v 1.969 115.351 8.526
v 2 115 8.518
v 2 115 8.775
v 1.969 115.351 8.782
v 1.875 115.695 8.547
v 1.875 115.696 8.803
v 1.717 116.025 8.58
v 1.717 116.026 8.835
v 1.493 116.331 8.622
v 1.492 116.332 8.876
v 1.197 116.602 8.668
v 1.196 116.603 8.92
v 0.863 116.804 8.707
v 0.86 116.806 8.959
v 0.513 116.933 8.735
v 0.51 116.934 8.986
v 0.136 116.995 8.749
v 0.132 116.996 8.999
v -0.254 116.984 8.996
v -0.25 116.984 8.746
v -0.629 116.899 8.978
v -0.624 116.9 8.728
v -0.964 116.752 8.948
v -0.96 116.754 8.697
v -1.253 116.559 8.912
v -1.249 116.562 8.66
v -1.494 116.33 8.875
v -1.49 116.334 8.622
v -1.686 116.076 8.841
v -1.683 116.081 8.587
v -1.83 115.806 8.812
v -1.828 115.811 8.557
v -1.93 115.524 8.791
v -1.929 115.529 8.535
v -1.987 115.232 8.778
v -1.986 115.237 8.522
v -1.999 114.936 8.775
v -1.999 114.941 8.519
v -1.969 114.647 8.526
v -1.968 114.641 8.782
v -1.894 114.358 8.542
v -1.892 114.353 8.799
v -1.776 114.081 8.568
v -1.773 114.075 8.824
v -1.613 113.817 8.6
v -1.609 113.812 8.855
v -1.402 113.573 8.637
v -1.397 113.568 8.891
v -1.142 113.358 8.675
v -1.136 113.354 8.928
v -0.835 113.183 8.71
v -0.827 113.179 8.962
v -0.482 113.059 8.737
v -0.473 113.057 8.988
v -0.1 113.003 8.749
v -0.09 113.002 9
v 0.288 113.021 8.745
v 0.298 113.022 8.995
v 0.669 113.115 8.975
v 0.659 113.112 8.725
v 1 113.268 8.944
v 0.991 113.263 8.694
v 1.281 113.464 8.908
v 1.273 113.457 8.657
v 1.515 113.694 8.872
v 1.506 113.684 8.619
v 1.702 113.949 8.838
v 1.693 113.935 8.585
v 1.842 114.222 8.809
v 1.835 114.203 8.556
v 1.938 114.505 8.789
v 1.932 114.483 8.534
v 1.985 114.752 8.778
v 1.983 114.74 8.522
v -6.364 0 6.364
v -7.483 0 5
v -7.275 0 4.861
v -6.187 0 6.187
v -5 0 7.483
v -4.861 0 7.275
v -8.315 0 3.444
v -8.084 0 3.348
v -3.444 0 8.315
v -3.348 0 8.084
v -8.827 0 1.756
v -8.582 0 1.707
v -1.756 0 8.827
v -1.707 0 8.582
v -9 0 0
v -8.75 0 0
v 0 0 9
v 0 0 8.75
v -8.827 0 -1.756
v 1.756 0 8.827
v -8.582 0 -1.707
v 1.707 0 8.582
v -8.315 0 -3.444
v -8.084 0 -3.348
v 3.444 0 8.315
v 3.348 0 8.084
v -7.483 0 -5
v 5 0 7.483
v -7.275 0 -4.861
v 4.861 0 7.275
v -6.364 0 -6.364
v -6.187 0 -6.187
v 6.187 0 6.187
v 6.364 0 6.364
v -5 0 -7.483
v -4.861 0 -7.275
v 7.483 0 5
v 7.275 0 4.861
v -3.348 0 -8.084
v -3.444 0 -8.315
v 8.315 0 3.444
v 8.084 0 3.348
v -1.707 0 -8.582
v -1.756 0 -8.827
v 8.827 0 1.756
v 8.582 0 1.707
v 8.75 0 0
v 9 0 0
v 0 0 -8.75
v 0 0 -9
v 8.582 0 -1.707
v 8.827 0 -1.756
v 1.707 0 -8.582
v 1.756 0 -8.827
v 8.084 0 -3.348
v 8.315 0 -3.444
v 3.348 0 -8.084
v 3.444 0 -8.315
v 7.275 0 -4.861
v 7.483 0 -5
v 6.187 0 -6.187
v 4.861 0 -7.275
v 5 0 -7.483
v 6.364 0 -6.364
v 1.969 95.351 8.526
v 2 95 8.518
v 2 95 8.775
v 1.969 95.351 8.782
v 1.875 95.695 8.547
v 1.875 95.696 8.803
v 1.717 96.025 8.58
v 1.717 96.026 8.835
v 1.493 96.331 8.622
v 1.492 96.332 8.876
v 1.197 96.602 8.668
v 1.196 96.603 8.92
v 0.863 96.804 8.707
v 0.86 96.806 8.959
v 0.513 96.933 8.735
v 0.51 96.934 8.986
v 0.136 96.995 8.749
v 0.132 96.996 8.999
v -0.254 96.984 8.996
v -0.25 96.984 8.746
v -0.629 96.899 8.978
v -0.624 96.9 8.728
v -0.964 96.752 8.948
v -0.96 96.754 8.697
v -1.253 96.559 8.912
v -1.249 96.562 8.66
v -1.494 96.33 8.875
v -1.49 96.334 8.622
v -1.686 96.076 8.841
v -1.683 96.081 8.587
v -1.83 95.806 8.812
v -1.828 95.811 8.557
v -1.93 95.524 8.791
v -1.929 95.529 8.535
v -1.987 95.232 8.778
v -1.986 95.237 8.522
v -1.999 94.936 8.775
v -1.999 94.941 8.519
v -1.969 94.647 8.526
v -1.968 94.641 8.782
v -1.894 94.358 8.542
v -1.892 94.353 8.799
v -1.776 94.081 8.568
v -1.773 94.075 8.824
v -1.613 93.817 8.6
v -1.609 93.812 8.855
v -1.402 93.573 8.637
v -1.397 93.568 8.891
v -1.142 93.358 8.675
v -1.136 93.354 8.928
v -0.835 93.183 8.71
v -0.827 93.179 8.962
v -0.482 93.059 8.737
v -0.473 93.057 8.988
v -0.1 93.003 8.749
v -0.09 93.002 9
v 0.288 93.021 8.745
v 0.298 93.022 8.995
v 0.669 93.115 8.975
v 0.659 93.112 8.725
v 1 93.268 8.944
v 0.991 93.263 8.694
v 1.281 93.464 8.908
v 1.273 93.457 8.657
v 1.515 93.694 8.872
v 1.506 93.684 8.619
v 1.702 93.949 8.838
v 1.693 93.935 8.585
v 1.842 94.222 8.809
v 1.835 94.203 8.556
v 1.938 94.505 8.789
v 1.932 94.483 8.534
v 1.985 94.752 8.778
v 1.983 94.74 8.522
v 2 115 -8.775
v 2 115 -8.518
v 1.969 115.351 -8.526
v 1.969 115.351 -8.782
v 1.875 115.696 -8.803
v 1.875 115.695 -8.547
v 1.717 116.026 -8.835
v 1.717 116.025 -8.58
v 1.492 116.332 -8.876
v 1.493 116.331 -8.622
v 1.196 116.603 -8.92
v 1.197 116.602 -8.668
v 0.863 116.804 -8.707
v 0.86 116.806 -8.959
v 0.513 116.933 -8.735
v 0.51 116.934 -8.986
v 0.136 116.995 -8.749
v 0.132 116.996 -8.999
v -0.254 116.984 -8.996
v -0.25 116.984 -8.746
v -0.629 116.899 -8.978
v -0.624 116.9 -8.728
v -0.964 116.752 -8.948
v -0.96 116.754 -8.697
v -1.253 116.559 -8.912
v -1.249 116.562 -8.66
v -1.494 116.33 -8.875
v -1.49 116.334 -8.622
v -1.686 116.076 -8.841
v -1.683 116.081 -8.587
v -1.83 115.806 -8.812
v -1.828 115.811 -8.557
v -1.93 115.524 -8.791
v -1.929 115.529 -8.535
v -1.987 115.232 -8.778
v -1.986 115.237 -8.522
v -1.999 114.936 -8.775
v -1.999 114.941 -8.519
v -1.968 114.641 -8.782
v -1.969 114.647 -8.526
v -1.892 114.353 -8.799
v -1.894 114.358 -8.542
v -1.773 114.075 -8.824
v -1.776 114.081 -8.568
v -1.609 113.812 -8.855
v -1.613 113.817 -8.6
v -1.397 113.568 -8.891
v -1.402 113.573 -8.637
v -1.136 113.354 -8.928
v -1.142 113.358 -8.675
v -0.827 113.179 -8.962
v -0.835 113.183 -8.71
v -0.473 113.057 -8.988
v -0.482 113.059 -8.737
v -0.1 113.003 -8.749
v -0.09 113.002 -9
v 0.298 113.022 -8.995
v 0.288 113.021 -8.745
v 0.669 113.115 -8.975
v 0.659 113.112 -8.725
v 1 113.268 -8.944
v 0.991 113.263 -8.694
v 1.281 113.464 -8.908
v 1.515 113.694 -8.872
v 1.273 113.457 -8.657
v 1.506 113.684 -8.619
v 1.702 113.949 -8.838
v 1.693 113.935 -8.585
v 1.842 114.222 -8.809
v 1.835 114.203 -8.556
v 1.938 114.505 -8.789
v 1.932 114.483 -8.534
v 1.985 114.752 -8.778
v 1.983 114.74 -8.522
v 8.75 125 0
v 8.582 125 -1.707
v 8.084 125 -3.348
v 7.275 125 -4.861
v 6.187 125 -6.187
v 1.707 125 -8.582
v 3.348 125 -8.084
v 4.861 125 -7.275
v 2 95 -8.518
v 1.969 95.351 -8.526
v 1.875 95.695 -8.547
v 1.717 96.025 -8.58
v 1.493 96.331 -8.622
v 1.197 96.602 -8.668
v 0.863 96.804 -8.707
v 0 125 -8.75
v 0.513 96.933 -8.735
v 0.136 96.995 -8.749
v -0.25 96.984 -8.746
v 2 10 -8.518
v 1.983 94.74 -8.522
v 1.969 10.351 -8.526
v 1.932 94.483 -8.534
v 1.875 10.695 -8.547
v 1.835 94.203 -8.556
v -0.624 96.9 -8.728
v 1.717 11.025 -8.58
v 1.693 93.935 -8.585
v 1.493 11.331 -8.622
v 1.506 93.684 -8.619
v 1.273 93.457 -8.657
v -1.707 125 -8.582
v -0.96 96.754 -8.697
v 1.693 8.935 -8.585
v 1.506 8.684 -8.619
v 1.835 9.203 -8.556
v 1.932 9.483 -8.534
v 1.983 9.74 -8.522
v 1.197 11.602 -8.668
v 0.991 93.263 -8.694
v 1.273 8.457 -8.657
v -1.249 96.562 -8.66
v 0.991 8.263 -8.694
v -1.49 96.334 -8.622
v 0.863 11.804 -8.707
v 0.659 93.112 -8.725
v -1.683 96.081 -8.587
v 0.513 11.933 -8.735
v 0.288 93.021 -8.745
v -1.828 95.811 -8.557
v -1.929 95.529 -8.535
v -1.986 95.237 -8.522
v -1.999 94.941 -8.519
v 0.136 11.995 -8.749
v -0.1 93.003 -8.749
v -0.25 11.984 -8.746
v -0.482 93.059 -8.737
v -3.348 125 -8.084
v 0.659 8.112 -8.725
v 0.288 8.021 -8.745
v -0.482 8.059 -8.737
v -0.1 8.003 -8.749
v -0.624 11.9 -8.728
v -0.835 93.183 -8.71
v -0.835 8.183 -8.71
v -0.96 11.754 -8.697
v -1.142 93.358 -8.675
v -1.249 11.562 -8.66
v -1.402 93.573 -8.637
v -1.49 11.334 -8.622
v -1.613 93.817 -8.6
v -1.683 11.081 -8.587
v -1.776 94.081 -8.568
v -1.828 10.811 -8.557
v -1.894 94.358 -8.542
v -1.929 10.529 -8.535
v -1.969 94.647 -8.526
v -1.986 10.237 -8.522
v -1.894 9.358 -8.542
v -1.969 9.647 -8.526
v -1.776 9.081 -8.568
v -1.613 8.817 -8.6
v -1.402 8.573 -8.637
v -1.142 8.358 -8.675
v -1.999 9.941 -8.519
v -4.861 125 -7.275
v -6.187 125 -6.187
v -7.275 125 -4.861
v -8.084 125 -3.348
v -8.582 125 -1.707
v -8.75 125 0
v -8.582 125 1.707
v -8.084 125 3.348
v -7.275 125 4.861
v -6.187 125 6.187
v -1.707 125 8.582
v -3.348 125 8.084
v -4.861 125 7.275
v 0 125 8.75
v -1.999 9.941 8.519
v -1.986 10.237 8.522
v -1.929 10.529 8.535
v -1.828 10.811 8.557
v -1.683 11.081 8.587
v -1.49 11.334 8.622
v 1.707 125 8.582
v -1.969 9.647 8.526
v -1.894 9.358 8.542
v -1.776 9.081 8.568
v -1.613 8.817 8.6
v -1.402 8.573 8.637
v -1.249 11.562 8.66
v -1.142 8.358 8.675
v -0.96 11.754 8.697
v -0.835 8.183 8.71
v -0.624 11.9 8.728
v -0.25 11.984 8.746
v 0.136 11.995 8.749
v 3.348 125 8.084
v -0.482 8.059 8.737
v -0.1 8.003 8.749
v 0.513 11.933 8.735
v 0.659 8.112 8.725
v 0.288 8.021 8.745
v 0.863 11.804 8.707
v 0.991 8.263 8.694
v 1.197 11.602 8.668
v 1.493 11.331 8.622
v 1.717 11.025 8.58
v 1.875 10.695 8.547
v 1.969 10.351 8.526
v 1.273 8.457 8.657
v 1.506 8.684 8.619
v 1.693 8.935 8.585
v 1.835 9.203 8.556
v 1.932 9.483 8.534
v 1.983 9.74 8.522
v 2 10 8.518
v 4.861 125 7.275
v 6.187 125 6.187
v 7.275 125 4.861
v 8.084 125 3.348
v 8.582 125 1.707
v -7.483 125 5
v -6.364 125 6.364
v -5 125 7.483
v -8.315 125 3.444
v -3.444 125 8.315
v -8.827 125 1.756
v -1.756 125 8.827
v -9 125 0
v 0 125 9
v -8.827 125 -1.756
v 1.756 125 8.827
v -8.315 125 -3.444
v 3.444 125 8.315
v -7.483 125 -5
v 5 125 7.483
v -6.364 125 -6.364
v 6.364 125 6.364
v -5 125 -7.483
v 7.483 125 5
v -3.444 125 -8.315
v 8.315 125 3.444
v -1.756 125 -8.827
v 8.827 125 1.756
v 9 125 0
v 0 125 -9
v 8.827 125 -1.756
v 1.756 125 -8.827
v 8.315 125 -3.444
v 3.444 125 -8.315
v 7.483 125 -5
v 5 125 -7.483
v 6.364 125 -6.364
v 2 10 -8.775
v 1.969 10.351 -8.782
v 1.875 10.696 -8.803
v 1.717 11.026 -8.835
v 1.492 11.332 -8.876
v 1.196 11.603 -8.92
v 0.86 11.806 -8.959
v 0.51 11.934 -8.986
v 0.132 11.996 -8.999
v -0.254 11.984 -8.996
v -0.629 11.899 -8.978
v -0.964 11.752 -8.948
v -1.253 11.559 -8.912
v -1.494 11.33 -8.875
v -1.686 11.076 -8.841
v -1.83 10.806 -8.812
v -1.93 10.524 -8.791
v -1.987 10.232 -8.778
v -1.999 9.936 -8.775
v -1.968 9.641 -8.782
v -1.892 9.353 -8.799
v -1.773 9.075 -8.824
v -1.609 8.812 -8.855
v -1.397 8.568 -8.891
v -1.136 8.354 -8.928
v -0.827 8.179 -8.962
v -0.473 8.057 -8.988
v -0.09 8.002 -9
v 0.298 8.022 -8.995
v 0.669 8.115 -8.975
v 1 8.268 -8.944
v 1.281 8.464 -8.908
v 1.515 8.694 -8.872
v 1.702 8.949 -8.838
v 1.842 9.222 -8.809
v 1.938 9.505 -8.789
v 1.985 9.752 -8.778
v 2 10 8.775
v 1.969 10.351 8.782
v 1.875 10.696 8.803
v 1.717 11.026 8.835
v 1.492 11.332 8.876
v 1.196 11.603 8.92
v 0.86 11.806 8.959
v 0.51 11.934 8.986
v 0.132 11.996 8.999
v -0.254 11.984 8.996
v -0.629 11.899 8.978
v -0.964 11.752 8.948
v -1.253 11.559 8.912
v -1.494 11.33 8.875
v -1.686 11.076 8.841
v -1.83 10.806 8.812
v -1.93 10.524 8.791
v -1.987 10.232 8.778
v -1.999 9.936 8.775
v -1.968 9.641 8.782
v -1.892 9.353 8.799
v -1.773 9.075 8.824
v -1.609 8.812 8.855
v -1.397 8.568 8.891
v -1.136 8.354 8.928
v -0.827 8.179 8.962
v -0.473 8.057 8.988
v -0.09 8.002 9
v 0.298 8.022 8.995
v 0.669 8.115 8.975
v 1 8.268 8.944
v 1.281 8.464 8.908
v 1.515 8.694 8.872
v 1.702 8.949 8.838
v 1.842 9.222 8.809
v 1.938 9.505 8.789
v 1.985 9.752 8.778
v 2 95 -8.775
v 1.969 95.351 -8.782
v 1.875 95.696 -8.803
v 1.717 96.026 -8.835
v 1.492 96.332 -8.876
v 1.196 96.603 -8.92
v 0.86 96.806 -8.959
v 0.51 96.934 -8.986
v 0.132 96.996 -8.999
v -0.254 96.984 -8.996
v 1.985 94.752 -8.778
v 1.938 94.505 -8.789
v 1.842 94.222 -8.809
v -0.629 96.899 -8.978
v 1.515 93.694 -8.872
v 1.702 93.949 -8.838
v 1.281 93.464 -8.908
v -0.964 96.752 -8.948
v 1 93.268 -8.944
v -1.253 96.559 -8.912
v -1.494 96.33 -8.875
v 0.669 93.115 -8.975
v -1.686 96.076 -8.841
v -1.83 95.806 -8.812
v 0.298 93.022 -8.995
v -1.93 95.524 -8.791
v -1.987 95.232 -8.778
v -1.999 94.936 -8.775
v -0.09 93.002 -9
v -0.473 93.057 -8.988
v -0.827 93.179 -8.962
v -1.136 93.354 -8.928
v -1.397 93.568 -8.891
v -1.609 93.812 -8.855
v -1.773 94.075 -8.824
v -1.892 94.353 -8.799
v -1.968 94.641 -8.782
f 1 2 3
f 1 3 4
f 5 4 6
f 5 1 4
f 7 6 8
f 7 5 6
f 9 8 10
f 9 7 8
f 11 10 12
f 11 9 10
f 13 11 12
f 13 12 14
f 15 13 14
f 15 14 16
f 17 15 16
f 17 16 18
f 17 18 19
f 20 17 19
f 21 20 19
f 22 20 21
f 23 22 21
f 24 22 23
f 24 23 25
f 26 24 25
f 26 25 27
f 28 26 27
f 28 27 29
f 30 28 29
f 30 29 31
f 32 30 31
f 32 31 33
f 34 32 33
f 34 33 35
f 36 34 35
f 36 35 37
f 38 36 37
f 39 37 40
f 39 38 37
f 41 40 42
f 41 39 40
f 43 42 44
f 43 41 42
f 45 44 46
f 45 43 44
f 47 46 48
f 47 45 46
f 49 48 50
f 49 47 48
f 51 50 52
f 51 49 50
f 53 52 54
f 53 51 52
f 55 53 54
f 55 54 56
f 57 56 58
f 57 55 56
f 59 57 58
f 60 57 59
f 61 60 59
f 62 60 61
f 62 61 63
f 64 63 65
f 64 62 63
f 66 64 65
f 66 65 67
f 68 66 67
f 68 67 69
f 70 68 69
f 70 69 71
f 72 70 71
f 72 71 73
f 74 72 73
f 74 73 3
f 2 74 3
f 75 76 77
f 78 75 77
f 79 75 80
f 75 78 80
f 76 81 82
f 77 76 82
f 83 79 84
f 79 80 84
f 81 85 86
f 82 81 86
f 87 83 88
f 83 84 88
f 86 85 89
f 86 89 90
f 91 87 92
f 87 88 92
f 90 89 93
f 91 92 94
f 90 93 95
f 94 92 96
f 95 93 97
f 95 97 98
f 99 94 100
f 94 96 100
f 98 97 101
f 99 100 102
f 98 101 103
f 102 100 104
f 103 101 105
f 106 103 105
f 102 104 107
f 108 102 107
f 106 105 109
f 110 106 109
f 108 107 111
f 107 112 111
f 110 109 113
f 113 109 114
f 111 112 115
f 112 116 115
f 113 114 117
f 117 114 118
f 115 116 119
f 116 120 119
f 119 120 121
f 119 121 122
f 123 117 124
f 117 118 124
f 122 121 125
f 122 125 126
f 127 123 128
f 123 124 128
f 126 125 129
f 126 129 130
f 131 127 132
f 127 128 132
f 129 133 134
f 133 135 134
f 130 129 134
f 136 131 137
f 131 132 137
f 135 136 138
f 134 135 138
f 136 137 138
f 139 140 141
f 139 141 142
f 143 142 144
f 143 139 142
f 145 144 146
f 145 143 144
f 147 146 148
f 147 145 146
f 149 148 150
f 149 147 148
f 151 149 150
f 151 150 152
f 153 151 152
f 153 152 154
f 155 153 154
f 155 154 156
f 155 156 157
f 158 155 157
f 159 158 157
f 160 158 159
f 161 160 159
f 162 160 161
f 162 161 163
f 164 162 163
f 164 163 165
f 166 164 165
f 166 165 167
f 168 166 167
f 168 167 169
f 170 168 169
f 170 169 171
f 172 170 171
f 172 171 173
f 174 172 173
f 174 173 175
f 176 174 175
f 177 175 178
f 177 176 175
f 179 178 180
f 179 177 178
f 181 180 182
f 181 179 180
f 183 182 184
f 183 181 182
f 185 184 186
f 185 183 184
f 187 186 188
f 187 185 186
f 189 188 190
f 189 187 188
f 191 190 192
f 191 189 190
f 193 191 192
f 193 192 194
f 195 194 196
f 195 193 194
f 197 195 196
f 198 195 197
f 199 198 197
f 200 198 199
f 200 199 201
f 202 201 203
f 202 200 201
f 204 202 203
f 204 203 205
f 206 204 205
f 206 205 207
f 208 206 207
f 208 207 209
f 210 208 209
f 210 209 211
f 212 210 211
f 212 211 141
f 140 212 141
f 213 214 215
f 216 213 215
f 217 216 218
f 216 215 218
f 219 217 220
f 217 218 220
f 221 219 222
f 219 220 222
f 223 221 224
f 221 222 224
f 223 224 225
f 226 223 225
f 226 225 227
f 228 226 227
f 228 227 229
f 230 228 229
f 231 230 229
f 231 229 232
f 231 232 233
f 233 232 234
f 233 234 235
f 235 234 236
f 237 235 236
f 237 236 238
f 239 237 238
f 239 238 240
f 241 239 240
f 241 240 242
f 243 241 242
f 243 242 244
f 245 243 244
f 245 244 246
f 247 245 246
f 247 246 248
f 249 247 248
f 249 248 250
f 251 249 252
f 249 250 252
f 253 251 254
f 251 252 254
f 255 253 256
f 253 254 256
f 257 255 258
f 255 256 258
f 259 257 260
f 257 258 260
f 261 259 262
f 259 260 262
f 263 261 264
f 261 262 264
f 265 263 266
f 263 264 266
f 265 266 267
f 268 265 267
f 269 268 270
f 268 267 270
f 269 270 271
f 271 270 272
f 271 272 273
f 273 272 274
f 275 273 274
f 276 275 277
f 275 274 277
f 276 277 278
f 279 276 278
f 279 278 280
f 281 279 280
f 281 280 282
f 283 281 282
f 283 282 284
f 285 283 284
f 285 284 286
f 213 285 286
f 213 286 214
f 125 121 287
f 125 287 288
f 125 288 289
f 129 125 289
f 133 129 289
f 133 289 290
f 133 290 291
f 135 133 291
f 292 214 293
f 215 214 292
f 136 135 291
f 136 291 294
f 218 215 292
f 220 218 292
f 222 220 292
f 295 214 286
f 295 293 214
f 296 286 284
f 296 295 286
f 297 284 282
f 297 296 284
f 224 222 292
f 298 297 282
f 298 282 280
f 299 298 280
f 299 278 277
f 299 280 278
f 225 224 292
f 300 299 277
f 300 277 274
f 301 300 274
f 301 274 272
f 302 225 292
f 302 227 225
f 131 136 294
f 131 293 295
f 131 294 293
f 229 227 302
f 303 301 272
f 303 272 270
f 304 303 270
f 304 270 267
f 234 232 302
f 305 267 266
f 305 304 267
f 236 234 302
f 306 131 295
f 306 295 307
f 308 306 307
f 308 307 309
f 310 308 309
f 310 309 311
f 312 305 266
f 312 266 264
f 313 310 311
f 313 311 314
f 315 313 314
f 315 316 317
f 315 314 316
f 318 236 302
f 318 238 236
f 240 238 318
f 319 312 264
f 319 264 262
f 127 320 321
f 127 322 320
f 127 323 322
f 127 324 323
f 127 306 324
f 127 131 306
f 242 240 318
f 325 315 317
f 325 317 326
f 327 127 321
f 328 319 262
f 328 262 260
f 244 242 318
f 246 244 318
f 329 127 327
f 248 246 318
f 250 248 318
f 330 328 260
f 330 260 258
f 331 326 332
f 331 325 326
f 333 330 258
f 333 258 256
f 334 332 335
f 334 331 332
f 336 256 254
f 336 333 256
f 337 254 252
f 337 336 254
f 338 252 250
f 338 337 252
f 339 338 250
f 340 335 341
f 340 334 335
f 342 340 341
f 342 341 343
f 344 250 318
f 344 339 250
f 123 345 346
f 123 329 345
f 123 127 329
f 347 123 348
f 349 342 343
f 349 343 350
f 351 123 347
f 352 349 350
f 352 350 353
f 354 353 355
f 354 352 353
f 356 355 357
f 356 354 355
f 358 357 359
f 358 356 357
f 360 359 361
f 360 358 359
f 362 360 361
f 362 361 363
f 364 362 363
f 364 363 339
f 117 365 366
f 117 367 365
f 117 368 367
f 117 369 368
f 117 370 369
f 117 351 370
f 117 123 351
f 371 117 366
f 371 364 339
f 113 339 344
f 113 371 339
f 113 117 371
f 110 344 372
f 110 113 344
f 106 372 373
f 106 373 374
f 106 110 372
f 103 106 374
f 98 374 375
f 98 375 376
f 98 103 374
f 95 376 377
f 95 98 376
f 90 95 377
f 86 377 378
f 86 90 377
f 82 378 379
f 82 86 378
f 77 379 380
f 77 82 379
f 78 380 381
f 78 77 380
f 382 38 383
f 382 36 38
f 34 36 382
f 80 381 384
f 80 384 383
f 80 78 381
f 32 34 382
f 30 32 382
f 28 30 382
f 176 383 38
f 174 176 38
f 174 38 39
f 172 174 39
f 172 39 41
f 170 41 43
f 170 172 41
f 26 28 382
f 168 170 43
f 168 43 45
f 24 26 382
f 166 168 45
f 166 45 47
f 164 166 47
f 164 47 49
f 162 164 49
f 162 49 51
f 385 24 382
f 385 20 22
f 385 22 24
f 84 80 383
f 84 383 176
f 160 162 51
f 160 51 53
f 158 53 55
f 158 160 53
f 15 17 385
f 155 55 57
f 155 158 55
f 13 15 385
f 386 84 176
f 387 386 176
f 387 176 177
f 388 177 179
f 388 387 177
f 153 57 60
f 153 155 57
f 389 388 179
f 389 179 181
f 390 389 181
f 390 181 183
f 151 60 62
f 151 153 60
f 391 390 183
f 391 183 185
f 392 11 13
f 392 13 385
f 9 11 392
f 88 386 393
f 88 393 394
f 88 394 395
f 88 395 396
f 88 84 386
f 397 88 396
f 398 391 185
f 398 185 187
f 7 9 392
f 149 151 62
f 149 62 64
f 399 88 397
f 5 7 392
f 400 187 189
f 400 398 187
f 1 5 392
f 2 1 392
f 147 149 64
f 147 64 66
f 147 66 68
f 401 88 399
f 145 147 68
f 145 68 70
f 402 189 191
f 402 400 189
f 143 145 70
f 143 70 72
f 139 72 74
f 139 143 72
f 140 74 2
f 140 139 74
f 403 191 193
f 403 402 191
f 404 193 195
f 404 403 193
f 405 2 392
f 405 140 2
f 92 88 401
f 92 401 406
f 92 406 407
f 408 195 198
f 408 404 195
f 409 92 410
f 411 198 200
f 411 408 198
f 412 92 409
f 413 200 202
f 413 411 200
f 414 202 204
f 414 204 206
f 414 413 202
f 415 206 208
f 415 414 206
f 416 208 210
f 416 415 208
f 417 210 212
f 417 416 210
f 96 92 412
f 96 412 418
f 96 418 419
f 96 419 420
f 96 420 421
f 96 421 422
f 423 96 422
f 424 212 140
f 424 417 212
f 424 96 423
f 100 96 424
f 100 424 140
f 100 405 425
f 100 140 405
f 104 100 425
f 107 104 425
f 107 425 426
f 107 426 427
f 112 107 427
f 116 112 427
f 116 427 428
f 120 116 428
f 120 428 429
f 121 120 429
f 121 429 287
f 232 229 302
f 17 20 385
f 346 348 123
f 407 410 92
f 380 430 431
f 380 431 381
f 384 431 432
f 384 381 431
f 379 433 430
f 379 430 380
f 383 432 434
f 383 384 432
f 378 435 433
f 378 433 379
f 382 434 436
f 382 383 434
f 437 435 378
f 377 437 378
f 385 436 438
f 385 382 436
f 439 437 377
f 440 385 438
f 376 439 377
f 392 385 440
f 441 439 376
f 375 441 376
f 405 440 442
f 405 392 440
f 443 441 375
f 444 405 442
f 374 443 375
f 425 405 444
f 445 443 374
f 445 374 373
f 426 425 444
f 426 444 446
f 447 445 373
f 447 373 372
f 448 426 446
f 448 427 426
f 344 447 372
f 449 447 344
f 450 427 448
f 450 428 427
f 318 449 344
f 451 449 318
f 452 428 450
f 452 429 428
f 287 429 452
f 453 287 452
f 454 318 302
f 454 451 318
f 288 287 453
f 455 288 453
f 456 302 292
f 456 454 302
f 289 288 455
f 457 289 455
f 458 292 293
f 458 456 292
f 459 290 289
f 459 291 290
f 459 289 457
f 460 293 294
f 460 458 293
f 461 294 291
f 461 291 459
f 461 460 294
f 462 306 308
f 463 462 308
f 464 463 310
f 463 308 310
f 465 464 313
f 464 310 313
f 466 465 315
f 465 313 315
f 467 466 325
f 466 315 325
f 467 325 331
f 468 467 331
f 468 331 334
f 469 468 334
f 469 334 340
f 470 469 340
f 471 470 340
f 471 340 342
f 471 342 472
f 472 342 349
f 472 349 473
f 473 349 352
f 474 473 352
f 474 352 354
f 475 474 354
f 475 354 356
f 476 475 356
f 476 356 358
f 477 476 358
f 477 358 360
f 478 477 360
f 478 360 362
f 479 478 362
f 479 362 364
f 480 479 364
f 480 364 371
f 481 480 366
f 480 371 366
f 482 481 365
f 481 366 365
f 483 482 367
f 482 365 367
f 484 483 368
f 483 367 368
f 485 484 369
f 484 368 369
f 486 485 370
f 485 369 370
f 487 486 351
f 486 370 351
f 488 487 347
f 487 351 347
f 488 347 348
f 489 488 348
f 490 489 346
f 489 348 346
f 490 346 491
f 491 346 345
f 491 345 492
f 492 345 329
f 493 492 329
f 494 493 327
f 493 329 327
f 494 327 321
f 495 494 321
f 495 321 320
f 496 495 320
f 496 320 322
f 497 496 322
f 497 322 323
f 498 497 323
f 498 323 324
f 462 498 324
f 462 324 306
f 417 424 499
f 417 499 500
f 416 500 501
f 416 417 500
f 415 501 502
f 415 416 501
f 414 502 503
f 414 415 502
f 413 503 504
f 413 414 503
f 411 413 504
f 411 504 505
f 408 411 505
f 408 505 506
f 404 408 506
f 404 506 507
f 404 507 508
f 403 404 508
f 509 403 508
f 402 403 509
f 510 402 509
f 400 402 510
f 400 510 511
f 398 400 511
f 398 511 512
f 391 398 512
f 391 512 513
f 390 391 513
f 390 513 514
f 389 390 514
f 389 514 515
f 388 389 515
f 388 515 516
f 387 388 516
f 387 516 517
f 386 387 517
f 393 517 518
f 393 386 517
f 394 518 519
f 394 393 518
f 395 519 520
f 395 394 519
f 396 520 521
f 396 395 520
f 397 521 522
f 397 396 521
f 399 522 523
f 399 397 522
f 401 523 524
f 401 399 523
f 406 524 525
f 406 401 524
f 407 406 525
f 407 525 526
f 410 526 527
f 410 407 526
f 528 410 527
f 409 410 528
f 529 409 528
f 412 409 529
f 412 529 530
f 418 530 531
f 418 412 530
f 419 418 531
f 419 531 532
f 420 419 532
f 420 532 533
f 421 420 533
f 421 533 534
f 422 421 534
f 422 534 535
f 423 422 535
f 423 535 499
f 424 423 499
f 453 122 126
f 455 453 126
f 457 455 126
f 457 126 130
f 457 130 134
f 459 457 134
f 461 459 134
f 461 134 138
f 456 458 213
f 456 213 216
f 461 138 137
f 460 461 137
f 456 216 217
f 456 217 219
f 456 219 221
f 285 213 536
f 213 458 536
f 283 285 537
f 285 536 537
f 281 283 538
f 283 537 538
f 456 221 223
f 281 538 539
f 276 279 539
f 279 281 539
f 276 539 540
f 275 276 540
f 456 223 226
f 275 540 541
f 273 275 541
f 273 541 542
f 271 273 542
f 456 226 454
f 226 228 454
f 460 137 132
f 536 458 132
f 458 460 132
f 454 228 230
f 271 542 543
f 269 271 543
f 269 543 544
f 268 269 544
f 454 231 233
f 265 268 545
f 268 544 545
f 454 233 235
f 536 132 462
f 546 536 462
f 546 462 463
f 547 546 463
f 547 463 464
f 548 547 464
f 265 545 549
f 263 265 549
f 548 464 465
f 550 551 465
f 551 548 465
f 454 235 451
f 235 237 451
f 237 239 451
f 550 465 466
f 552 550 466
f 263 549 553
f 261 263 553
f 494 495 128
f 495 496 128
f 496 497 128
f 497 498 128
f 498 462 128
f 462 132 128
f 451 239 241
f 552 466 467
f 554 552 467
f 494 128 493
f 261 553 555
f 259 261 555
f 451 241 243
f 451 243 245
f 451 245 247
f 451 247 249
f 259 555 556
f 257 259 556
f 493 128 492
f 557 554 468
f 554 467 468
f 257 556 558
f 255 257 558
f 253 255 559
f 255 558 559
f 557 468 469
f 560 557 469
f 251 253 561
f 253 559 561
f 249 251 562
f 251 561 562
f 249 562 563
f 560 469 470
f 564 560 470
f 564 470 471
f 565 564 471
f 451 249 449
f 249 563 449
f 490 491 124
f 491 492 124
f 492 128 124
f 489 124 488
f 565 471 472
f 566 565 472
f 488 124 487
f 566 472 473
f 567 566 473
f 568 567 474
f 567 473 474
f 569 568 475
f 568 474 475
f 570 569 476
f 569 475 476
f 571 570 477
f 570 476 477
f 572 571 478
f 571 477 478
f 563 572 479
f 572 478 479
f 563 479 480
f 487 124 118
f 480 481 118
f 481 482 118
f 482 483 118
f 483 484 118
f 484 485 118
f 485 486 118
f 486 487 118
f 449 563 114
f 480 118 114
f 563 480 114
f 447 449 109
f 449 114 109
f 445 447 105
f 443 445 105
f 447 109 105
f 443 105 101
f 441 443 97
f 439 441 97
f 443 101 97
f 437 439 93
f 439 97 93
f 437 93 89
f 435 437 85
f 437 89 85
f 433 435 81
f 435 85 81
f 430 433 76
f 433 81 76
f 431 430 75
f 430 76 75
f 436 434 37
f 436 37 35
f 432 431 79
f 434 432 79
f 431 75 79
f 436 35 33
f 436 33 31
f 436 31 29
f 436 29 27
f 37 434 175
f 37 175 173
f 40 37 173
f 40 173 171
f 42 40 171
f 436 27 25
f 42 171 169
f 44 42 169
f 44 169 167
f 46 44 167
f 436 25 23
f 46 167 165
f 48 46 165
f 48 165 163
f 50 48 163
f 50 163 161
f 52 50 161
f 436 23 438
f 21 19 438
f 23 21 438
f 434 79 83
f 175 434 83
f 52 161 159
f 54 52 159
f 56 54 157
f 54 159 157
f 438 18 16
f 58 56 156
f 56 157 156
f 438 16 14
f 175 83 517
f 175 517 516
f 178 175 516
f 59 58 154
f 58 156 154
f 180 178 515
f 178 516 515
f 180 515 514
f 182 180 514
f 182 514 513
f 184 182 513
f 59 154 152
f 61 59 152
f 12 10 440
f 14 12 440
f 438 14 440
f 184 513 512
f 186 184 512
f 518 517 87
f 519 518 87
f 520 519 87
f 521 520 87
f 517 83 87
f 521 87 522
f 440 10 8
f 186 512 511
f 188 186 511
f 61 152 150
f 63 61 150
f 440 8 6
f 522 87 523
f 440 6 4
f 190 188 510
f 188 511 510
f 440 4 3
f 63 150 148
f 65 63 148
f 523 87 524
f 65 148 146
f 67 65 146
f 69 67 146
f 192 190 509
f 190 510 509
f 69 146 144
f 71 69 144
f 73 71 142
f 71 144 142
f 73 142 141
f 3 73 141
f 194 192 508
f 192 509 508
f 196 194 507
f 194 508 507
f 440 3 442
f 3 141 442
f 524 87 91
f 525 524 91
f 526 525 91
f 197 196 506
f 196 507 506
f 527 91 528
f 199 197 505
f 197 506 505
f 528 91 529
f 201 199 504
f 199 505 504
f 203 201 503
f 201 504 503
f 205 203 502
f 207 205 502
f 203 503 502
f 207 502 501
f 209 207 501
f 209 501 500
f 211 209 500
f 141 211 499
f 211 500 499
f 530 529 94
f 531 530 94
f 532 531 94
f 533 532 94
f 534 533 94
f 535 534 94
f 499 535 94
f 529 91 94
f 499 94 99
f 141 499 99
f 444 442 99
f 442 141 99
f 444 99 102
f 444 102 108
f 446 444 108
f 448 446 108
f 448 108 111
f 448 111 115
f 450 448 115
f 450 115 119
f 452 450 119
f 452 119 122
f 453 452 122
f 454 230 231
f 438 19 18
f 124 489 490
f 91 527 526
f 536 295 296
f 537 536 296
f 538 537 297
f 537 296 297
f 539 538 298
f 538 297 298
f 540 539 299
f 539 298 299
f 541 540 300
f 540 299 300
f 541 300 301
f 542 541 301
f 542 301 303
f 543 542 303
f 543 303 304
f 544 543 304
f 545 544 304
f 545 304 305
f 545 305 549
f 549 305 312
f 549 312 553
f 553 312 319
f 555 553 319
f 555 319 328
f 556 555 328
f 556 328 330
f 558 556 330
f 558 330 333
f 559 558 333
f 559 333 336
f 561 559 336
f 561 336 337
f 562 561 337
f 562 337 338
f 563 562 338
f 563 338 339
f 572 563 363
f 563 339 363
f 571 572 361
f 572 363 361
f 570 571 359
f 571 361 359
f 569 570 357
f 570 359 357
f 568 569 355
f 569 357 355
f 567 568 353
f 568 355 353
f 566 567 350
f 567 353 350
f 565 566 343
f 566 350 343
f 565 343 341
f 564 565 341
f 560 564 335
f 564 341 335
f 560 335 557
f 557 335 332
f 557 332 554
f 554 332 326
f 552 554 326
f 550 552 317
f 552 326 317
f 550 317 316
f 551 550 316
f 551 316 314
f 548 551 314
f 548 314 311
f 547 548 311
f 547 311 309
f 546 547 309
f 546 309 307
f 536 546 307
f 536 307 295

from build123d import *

# Parameters (mm, degrees)
SKETCH1_R               = 9
SKETCH1_R_2             = 8.75
BOSS_EXTRUDE1_DEPTH     = 125
SKETCH2_R               = 2
CUT_EXTRUDE1_DEPTH      = 10
CUT_EXTRUDE1_DEPTH_BACK = 10


with BuildPart() as part:
    # Sketch1 → Boss-Extrude1 (new body)
    with BuildSketch(Plane(origin=(0, 0, 0), x_dir=(1, 0, 0), z_dir=(0, 1, 0))):
        Circle(SKETCH1_R)
        Circle(SKETCH1_R_2, mode=Mode.SUBTRACT)
    extrude(amount=BOSS_EXTRUDE1_DEPTH)

    # Sketch2 → Cut-Extrude1 (cut, two sides)
    with BuildSketch(Plane.XY) as cut_extrude1_sk:
        with Locations((0, 95)):
            Circle(SKETCH2_R)
        with Locations((0, 115)):
            Circle(SKETCH2_R)
        with Locations((0, 10)):
            Circle(SKETCH2_R)
    extrude(amount=CUT_EXTRUDE1_DEPTH, mode=Mode.SUBTRACT)
    extrude(cut_extrude1_sk.sketch, amount=-CUT_EXTRUDE1_DEPTH_BACK, mode=Mode.SUBTRACT)


solid = part.part
